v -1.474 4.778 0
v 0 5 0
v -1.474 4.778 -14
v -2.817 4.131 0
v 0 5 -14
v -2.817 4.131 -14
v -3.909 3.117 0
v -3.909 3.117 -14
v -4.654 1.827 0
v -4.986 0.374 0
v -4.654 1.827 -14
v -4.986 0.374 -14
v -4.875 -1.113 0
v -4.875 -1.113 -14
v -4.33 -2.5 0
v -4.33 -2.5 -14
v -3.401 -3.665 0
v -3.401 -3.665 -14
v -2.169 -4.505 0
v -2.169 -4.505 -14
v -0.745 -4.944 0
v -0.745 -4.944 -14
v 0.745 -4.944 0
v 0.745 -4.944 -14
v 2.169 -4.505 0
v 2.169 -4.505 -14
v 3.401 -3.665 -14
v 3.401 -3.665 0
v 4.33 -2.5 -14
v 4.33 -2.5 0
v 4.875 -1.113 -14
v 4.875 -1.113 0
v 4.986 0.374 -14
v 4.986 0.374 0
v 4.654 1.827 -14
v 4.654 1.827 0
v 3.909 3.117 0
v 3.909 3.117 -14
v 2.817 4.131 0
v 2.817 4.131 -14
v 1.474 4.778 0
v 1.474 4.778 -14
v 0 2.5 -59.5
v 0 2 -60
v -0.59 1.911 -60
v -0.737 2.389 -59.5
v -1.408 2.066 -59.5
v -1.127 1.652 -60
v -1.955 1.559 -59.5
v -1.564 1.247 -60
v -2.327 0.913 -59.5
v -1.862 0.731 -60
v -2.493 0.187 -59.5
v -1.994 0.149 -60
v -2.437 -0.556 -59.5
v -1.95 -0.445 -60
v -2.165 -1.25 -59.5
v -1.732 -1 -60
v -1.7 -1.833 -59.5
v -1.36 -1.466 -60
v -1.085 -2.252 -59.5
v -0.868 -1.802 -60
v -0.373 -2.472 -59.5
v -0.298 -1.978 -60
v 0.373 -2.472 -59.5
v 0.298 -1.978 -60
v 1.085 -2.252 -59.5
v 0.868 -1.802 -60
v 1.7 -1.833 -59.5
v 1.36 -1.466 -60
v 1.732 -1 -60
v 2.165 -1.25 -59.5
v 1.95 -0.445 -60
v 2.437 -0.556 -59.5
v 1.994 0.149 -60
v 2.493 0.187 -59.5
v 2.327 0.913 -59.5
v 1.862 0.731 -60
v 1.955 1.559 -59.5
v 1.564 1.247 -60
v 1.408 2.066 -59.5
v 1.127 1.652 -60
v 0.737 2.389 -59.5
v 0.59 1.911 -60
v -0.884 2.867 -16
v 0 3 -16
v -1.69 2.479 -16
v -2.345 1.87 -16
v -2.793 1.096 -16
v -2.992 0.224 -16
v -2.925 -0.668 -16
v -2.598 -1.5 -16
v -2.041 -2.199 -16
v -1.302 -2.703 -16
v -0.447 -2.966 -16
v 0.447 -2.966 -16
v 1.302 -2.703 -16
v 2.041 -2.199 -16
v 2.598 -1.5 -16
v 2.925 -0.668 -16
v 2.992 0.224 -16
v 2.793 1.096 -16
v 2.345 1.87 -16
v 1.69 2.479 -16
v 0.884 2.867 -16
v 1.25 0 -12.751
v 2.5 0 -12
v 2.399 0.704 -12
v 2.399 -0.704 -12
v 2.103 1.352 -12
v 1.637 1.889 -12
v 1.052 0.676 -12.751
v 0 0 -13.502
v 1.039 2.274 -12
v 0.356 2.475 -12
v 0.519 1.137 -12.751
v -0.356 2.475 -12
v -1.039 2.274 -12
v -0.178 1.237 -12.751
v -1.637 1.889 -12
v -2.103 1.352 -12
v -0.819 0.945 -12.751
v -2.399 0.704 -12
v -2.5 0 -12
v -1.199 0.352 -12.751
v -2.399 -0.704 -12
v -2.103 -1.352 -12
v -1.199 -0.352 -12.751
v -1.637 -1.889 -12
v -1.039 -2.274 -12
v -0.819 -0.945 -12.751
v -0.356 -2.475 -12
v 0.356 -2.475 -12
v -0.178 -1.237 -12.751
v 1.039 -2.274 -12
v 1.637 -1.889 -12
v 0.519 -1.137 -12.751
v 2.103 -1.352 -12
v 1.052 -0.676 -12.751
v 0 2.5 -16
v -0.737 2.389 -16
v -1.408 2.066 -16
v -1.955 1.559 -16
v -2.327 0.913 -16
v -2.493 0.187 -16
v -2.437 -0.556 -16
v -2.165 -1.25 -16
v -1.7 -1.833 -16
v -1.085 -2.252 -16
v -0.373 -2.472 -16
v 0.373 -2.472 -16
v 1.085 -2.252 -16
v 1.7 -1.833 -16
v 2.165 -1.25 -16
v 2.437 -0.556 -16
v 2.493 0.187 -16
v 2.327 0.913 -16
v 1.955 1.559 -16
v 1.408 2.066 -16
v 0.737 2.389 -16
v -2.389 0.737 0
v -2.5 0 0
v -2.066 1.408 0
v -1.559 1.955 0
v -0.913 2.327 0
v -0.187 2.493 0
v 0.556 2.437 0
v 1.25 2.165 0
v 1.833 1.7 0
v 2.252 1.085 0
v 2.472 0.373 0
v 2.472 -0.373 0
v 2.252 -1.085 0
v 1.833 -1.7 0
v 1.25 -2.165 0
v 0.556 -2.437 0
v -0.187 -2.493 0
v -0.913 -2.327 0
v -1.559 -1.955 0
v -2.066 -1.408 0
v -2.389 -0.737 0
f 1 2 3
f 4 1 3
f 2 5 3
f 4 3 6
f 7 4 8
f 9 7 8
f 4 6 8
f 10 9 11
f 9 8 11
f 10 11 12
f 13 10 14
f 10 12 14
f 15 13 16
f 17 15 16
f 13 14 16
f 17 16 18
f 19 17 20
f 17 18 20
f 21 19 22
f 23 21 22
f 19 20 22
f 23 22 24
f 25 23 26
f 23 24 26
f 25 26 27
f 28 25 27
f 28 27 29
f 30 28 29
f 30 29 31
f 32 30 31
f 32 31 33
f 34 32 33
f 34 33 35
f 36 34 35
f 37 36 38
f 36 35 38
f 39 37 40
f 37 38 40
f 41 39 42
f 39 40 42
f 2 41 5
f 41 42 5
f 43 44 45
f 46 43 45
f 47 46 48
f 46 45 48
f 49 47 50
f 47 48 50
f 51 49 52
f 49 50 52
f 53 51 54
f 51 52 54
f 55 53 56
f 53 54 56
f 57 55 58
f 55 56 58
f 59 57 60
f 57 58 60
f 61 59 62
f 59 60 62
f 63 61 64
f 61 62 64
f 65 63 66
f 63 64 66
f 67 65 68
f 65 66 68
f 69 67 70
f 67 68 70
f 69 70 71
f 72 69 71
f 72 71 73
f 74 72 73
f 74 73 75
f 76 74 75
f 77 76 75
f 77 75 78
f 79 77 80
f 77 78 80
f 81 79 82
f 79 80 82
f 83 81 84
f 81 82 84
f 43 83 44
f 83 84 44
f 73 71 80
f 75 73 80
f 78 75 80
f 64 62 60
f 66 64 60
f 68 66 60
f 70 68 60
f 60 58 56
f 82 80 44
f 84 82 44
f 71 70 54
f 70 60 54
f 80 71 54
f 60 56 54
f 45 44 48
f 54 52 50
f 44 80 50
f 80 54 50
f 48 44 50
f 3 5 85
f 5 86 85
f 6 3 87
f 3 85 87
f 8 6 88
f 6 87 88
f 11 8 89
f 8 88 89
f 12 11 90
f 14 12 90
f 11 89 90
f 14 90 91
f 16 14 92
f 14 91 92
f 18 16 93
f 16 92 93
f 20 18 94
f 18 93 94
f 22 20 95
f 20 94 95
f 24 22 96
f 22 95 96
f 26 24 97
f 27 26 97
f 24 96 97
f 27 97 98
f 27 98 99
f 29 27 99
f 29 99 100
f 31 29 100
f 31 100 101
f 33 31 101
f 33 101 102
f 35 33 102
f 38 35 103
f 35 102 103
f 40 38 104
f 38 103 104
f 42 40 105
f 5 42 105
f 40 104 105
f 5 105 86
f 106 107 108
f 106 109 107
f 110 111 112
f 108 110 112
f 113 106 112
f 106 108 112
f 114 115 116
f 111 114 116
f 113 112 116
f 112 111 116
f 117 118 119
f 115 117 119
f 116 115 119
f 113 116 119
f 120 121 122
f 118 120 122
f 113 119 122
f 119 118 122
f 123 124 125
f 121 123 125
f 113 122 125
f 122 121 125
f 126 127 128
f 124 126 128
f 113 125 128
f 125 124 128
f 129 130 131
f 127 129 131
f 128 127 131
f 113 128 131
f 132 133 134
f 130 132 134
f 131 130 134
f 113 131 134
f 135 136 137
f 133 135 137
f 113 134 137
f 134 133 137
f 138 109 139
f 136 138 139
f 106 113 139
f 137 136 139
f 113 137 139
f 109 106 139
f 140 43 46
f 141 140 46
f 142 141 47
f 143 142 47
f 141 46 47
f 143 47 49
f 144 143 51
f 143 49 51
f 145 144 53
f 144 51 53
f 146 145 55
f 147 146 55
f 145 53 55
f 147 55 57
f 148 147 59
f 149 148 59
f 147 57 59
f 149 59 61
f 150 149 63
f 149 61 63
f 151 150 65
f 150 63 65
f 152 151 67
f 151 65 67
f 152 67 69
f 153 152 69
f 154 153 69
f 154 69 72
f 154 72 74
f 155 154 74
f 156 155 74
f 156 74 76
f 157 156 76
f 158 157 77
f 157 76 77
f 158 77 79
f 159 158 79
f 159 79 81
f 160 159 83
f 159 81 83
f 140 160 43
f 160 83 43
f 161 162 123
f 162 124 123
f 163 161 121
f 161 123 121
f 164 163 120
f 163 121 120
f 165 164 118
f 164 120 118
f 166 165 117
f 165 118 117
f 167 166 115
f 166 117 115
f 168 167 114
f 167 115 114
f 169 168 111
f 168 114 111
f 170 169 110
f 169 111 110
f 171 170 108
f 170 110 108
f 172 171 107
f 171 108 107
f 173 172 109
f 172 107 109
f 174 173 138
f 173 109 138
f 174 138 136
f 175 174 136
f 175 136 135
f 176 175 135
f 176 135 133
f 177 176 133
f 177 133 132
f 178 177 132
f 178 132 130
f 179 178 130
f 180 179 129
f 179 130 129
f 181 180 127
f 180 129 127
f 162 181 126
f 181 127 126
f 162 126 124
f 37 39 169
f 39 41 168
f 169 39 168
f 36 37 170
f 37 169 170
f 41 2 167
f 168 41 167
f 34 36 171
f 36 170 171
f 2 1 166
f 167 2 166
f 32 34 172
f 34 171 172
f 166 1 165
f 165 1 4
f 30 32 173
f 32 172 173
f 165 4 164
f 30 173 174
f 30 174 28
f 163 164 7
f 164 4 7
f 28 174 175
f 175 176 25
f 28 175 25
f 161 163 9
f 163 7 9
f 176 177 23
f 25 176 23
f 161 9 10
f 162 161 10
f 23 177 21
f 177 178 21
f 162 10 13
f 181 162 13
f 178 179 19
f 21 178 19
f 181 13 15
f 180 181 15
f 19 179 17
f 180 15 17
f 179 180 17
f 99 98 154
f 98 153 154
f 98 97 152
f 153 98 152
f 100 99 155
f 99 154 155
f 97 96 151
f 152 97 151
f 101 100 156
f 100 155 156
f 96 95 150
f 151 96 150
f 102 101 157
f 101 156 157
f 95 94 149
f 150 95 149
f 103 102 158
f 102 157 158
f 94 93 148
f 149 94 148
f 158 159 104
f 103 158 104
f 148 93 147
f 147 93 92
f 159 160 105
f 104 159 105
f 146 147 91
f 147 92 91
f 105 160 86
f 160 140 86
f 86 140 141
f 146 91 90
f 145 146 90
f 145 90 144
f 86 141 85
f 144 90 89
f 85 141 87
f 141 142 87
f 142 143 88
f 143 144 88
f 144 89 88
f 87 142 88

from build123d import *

# Parameters (mm, degrees)
M6X1_0_1_D     = 5
M6X1_0_1_DEPTH = 12
M6X1_0_1_TIP   = 1.502151548
CHAMFER_1_SIZE = 0.5


with BuildPart() as part:
    # 스케치1 → 회전1 (revolve)
    with BuildSketch(Plane(origin=(0, 0, 0), x_dir=(0, 0, -1), z_dir=(1, 0, 0))):
        Polygon((0, 0), (0, 5), (14, 5), (16, 3), (16, 2.5), (60, 2.5), (60, 0), align=None)
    revolve(axis=Axis((0, 0, -60), (0, 0, 1)))

    # M6x1.0 나사 구멍1
    with Locations(Plane.XY):
        with Locations((0, 0)):
            Hole(M6X1_0_1_D / 2, depth=M6X1_0_1_DEPTH)
            with Locations((0, 0, -(M6X1_0_1_DEPTH + M6X1_0_1_TIP / 2))):  # 118° drill point
                Cone(0, M6X1_0_1_D / 2, M6X1_0_1_TIP, mode=Mode.SUBTRACT)

    # 모따기1
    chamfer_1_edges = [part.edges().sort_by_distance(p)[0] for p in [
        (0, -2.5, -60),
    ]]
    chamfer(chamfer_1_edges, length=CHAMFER_1_SIZE)


solid = part.part
